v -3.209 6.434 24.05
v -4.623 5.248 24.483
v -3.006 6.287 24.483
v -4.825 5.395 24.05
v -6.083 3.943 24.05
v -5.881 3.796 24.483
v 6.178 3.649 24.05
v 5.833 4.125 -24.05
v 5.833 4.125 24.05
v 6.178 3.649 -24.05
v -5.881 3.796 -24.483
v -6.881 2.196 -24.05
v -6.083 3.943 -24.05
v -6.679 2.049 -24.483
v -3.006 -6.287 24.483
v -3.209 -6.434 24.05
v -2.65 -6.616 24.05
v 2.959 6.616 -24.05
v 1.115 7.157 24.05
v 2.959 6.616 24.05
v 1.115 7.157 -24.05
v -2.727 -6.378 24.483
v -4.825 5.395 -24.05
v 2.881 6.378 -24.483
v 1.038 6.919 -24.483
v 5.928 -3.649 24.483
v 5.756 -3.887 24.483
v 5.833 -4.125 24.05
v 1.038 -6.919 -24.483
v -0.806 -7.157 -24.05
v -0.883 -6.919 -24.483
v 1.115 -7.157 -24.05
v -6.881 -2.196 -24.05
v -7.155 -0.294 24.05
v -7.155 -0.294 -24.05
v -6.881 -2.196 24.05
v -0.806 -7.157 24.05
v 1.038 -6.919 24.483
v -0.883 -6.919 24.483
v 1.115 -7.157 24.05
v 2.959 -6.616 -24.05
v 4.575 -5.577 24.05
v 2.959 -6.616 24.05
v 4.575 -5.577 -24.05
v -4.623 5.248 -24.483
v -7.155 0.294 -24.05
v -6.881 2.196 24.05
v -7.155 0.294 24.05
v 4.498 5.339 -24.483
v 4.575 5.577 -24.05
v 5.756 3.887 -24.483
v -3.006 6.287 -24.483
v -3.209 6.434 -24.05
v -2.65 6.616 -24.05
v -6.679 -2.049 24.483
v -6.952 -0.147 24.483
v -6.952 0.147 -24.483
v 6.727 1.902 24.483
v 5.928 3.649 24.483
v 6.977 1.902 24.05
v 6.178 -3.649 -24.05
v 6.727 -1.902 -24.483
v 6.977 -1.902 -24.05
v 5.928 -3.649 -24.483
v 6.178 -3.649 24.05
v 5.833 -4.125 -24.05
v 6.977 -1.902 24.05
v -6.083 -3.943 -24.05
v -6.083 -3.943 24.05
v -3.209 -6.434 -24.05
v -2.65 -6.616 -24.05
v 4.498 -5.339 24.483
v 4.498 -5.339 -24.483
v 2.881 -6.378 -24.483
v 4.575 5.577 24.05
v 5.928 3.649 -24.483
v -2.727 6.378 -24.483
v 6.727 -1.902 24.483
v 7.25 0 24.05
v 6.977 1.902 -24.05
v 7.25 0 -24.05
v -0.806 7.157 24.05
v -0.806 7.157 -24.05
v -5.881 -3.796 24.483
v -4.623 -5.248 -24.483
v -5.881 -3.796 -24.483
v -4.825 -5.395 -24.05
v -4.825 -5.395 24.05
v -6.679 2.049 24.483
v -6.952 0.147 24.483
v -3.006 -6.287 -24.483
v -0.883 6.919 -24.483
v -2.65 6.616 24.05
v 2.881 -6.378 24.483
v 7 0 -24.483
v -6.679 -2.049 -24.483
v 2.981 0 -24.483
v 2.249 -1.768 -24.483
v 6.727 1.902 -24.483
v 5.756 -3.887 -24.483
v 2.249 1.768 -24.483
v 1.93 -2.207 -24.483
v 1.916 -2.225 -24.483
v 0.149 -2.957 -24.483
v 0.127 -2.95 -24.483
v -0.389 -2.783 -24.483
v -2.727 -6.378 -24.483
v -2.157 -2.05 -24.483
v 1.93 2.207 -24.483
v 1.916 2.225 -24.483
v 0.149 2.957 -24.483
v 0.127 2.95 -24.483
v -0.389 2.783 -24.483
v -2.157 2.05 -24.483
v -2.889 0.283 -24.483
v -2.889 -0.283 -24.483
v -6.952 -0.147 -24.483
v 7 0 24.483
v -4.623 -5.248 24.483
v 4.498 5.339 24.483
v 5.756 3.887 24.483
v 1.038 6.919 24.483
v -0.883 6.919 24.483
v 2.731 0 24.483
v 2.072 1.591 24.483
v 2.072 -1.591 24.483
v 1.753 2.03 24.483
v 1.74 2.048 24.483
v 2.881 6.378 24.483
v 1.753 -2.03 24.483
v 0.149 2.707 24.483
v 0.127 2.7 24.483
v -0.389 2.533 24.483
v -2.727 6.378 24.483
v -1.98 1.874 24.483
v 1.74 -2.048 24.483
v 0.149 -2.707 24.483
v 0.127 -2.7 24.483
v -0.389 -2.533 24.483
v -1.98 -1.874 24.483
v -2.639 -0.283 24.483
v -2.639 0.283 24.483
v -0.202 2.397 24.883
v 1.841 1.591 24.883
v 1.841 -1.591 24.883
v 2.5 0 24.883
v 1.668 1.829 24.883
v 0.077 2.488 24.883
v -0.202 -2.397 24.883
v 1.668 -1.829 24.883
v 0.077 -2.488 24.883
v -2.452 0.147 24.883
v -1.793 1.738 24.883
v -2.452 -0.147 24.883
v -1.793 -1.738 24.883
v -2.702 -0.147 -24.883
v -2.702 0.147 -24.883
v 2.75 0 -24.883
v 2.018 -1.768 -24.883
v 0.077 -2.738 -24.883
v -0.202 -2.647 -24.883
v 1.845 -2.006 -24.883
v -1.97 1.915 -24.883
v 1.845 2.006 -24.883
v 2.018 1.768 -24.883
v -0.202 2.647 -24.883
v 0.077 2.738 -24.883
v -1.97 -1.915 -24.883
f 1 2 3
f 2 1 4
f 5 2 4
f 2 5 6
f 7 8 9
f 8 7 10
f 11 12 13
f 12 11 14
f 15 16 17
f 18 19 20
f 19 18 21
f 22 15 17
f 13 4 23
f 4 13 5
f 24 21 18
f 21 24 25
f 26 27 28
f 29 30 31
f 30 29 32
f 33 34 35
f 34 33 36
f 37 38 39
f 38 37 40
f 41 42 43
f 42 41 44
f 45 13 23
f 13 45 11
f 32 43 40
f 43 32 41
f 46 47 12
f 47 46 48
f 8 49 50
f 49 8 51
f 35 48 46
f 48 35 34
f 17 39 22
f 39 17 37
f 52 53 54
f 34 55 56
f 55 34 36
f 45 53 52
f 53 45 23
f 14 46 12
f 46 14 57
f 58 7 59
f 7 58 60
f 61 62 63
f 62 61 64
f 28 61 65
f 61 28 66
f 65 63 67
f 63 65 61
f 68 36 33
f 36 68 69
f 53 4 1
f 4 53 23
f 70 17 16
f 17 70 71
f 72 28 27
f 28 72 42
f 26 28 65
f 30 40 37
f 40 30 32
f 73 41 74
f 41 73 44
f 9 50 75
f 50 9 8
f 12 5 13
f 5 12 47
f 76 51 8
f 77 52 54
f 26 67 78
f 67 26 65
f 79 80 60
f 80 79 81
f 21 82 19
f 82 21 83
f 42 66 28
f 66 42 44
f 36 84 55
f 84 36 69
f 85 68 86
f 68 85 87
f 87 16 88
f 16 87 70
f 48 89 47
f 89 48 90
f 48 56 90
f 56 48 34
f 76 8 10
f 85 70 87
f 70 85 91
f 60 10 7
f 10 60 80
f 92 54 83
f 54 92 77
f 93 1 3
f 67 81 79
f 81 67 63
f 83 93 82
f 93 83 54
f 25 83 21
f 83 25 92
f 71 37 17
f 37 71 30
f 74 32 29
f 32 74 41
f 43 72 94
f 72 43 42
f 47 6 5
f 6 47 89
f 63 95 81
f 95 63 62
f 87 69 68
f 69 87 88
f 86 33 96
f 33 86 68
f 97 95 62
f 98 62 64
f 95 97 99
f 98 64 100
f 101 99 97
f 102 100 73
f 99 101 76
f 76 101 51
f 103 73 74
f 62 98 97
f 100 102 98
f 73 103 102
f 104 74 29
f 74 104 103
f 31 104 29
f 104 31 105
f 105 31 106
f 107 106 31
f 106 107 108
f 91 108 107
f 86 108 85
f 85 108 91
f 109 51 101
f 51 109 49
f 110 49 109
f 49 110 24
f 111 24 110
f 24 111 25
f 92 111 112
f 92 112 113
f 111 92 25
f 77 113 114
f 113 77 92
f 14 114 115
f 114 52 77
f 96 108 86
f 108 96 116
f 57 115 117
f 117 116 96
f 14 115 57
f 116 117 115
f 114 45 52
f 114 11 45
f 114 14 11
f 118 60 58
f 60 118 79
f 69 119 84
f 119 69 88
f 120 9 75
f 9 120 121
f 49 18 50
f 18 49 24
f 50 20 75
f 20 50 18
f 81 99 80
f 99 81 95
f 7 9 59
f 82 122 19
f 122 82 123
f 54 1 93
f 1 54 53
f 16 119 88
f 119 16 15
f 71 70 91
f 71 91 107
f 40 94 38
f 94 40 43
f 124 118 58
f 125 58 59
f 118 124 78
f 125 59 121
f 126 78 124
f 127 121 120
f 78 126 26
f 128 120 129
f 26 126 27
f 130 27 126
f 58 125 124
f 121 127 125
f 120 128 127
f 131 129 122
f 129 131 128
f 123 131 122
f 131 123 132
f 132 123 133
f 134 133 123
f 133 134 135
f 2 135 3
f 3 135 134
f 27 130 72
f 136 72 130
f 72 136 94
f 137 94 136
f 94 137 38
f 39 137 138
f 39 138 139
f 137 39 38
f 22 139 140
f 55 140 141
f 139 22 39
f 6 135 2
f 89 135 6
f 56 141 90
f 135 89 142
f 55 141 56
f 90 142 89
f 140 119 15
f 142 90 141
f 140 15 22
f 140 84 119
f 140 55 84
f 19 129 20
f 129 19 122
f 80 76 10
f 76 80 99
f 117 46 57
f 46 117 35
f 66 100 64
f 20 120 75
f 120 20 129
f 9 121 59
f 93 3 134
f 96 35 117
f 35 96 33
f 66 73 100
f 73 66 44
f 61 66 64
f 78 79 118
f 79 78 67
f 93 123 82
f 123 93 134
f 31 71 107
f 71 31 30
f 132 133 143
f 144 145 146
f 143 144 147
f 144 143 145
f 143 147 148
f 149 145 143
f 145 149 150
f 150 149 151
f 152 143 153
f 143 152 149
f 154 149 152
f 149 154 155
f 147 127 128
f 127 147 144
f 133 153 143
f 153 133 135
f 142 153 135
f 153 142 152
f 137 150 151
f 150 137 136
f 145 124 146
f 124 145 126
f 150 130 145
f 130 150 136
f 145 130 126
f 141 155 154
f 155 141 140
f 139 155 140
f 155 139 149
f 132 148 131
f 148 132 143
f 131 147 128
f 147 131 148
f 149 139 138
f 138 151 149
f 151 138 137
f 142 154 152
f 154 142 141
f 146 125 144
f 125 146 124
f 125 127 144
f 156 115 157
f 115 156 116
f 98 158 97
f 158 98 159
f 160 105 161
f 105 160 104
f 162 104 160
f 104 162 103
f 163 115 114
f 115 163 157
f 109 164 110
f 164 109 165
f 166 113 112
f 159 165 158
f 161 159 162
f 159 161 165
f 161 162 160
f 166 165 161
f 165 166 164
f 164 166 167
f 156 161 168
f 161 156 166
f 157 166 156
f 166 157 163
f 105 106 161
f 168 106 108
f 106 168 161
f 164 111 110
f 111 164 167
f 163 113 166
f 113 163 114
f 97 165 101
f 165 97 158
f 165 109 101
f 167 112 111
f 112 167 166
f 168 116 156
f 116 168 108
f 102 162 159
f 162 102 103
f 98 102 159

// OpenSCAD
// Parameters
overall_height_mm = 50.5; //[25.25:101:0.1]
body_diameter_mm = 14.5; //[7.25:29:0.1]
positive_terminal_diameter_mm = 5.5; //[2.75:11:0.1]
positive_terminal_height_mm = 1.2; //[0.6:2.4:0.05]
negative_terminal_diameter_mm = 6; //[3:12:0.1]
negative_terminal_height_mm = 0.2; //[0.1:0.6:0.05]
terminal_edge_radius_mm = 0.5; //[0.25:1:0.05]
terminal_overlap_mm = 0.8; //[0.5:2:0.1]
rounding_fn_mm = 0.01; //[0.005:0.05:0.005]

// Battery - complete geometry
module battery() {
  color("DimGray") {
    // Cylindrical cell body with edge rounding
    minkowski() {
      cylinder(
        h = overall_height_mm - positive_terminal_height_mm - negative_terminal_height_mm - 2 * terminal_edge_radius_mm,
        r = body_diameter_mm / 2 - terminal_edge_radius_mm,
        center = true
      );
      sphere(r = terminal_edge_radius_mm, center = true);
    }

    // Positive terminal button with edge rounding
    translate([0, 0, (overall_height_mm - positive_terminal_height_mm) / 2 - terminal_overlap_mm])
      minkowski() {
        cylinder(
          h = positive_terminal_height_mm,
          r = positive_terminal_diameter_mm / 2 - terminal_edge_radius_mm,
          center = true
        );
        sphere(r = terminal_edge_radius_mm, center = true);
      }

    // Negative terminal flat end with edge rounding
    translate([0, 0, -(overall_height_mm - negative_terminal_height_mm) / 2 + terminal_overlap_mm])
      minkowski() {
        cylinder(
          h = negative_terminal_height_mm,
          r = negative_terminal_diameter_mm / 2 - terminal_edge_radius_mm,
          center = true
        );
        sphere(r = terminal_edge_radius_mm, center = true);
      }
  }
}

// Assembly
module assembly() {
  battery();
}

assembly();
